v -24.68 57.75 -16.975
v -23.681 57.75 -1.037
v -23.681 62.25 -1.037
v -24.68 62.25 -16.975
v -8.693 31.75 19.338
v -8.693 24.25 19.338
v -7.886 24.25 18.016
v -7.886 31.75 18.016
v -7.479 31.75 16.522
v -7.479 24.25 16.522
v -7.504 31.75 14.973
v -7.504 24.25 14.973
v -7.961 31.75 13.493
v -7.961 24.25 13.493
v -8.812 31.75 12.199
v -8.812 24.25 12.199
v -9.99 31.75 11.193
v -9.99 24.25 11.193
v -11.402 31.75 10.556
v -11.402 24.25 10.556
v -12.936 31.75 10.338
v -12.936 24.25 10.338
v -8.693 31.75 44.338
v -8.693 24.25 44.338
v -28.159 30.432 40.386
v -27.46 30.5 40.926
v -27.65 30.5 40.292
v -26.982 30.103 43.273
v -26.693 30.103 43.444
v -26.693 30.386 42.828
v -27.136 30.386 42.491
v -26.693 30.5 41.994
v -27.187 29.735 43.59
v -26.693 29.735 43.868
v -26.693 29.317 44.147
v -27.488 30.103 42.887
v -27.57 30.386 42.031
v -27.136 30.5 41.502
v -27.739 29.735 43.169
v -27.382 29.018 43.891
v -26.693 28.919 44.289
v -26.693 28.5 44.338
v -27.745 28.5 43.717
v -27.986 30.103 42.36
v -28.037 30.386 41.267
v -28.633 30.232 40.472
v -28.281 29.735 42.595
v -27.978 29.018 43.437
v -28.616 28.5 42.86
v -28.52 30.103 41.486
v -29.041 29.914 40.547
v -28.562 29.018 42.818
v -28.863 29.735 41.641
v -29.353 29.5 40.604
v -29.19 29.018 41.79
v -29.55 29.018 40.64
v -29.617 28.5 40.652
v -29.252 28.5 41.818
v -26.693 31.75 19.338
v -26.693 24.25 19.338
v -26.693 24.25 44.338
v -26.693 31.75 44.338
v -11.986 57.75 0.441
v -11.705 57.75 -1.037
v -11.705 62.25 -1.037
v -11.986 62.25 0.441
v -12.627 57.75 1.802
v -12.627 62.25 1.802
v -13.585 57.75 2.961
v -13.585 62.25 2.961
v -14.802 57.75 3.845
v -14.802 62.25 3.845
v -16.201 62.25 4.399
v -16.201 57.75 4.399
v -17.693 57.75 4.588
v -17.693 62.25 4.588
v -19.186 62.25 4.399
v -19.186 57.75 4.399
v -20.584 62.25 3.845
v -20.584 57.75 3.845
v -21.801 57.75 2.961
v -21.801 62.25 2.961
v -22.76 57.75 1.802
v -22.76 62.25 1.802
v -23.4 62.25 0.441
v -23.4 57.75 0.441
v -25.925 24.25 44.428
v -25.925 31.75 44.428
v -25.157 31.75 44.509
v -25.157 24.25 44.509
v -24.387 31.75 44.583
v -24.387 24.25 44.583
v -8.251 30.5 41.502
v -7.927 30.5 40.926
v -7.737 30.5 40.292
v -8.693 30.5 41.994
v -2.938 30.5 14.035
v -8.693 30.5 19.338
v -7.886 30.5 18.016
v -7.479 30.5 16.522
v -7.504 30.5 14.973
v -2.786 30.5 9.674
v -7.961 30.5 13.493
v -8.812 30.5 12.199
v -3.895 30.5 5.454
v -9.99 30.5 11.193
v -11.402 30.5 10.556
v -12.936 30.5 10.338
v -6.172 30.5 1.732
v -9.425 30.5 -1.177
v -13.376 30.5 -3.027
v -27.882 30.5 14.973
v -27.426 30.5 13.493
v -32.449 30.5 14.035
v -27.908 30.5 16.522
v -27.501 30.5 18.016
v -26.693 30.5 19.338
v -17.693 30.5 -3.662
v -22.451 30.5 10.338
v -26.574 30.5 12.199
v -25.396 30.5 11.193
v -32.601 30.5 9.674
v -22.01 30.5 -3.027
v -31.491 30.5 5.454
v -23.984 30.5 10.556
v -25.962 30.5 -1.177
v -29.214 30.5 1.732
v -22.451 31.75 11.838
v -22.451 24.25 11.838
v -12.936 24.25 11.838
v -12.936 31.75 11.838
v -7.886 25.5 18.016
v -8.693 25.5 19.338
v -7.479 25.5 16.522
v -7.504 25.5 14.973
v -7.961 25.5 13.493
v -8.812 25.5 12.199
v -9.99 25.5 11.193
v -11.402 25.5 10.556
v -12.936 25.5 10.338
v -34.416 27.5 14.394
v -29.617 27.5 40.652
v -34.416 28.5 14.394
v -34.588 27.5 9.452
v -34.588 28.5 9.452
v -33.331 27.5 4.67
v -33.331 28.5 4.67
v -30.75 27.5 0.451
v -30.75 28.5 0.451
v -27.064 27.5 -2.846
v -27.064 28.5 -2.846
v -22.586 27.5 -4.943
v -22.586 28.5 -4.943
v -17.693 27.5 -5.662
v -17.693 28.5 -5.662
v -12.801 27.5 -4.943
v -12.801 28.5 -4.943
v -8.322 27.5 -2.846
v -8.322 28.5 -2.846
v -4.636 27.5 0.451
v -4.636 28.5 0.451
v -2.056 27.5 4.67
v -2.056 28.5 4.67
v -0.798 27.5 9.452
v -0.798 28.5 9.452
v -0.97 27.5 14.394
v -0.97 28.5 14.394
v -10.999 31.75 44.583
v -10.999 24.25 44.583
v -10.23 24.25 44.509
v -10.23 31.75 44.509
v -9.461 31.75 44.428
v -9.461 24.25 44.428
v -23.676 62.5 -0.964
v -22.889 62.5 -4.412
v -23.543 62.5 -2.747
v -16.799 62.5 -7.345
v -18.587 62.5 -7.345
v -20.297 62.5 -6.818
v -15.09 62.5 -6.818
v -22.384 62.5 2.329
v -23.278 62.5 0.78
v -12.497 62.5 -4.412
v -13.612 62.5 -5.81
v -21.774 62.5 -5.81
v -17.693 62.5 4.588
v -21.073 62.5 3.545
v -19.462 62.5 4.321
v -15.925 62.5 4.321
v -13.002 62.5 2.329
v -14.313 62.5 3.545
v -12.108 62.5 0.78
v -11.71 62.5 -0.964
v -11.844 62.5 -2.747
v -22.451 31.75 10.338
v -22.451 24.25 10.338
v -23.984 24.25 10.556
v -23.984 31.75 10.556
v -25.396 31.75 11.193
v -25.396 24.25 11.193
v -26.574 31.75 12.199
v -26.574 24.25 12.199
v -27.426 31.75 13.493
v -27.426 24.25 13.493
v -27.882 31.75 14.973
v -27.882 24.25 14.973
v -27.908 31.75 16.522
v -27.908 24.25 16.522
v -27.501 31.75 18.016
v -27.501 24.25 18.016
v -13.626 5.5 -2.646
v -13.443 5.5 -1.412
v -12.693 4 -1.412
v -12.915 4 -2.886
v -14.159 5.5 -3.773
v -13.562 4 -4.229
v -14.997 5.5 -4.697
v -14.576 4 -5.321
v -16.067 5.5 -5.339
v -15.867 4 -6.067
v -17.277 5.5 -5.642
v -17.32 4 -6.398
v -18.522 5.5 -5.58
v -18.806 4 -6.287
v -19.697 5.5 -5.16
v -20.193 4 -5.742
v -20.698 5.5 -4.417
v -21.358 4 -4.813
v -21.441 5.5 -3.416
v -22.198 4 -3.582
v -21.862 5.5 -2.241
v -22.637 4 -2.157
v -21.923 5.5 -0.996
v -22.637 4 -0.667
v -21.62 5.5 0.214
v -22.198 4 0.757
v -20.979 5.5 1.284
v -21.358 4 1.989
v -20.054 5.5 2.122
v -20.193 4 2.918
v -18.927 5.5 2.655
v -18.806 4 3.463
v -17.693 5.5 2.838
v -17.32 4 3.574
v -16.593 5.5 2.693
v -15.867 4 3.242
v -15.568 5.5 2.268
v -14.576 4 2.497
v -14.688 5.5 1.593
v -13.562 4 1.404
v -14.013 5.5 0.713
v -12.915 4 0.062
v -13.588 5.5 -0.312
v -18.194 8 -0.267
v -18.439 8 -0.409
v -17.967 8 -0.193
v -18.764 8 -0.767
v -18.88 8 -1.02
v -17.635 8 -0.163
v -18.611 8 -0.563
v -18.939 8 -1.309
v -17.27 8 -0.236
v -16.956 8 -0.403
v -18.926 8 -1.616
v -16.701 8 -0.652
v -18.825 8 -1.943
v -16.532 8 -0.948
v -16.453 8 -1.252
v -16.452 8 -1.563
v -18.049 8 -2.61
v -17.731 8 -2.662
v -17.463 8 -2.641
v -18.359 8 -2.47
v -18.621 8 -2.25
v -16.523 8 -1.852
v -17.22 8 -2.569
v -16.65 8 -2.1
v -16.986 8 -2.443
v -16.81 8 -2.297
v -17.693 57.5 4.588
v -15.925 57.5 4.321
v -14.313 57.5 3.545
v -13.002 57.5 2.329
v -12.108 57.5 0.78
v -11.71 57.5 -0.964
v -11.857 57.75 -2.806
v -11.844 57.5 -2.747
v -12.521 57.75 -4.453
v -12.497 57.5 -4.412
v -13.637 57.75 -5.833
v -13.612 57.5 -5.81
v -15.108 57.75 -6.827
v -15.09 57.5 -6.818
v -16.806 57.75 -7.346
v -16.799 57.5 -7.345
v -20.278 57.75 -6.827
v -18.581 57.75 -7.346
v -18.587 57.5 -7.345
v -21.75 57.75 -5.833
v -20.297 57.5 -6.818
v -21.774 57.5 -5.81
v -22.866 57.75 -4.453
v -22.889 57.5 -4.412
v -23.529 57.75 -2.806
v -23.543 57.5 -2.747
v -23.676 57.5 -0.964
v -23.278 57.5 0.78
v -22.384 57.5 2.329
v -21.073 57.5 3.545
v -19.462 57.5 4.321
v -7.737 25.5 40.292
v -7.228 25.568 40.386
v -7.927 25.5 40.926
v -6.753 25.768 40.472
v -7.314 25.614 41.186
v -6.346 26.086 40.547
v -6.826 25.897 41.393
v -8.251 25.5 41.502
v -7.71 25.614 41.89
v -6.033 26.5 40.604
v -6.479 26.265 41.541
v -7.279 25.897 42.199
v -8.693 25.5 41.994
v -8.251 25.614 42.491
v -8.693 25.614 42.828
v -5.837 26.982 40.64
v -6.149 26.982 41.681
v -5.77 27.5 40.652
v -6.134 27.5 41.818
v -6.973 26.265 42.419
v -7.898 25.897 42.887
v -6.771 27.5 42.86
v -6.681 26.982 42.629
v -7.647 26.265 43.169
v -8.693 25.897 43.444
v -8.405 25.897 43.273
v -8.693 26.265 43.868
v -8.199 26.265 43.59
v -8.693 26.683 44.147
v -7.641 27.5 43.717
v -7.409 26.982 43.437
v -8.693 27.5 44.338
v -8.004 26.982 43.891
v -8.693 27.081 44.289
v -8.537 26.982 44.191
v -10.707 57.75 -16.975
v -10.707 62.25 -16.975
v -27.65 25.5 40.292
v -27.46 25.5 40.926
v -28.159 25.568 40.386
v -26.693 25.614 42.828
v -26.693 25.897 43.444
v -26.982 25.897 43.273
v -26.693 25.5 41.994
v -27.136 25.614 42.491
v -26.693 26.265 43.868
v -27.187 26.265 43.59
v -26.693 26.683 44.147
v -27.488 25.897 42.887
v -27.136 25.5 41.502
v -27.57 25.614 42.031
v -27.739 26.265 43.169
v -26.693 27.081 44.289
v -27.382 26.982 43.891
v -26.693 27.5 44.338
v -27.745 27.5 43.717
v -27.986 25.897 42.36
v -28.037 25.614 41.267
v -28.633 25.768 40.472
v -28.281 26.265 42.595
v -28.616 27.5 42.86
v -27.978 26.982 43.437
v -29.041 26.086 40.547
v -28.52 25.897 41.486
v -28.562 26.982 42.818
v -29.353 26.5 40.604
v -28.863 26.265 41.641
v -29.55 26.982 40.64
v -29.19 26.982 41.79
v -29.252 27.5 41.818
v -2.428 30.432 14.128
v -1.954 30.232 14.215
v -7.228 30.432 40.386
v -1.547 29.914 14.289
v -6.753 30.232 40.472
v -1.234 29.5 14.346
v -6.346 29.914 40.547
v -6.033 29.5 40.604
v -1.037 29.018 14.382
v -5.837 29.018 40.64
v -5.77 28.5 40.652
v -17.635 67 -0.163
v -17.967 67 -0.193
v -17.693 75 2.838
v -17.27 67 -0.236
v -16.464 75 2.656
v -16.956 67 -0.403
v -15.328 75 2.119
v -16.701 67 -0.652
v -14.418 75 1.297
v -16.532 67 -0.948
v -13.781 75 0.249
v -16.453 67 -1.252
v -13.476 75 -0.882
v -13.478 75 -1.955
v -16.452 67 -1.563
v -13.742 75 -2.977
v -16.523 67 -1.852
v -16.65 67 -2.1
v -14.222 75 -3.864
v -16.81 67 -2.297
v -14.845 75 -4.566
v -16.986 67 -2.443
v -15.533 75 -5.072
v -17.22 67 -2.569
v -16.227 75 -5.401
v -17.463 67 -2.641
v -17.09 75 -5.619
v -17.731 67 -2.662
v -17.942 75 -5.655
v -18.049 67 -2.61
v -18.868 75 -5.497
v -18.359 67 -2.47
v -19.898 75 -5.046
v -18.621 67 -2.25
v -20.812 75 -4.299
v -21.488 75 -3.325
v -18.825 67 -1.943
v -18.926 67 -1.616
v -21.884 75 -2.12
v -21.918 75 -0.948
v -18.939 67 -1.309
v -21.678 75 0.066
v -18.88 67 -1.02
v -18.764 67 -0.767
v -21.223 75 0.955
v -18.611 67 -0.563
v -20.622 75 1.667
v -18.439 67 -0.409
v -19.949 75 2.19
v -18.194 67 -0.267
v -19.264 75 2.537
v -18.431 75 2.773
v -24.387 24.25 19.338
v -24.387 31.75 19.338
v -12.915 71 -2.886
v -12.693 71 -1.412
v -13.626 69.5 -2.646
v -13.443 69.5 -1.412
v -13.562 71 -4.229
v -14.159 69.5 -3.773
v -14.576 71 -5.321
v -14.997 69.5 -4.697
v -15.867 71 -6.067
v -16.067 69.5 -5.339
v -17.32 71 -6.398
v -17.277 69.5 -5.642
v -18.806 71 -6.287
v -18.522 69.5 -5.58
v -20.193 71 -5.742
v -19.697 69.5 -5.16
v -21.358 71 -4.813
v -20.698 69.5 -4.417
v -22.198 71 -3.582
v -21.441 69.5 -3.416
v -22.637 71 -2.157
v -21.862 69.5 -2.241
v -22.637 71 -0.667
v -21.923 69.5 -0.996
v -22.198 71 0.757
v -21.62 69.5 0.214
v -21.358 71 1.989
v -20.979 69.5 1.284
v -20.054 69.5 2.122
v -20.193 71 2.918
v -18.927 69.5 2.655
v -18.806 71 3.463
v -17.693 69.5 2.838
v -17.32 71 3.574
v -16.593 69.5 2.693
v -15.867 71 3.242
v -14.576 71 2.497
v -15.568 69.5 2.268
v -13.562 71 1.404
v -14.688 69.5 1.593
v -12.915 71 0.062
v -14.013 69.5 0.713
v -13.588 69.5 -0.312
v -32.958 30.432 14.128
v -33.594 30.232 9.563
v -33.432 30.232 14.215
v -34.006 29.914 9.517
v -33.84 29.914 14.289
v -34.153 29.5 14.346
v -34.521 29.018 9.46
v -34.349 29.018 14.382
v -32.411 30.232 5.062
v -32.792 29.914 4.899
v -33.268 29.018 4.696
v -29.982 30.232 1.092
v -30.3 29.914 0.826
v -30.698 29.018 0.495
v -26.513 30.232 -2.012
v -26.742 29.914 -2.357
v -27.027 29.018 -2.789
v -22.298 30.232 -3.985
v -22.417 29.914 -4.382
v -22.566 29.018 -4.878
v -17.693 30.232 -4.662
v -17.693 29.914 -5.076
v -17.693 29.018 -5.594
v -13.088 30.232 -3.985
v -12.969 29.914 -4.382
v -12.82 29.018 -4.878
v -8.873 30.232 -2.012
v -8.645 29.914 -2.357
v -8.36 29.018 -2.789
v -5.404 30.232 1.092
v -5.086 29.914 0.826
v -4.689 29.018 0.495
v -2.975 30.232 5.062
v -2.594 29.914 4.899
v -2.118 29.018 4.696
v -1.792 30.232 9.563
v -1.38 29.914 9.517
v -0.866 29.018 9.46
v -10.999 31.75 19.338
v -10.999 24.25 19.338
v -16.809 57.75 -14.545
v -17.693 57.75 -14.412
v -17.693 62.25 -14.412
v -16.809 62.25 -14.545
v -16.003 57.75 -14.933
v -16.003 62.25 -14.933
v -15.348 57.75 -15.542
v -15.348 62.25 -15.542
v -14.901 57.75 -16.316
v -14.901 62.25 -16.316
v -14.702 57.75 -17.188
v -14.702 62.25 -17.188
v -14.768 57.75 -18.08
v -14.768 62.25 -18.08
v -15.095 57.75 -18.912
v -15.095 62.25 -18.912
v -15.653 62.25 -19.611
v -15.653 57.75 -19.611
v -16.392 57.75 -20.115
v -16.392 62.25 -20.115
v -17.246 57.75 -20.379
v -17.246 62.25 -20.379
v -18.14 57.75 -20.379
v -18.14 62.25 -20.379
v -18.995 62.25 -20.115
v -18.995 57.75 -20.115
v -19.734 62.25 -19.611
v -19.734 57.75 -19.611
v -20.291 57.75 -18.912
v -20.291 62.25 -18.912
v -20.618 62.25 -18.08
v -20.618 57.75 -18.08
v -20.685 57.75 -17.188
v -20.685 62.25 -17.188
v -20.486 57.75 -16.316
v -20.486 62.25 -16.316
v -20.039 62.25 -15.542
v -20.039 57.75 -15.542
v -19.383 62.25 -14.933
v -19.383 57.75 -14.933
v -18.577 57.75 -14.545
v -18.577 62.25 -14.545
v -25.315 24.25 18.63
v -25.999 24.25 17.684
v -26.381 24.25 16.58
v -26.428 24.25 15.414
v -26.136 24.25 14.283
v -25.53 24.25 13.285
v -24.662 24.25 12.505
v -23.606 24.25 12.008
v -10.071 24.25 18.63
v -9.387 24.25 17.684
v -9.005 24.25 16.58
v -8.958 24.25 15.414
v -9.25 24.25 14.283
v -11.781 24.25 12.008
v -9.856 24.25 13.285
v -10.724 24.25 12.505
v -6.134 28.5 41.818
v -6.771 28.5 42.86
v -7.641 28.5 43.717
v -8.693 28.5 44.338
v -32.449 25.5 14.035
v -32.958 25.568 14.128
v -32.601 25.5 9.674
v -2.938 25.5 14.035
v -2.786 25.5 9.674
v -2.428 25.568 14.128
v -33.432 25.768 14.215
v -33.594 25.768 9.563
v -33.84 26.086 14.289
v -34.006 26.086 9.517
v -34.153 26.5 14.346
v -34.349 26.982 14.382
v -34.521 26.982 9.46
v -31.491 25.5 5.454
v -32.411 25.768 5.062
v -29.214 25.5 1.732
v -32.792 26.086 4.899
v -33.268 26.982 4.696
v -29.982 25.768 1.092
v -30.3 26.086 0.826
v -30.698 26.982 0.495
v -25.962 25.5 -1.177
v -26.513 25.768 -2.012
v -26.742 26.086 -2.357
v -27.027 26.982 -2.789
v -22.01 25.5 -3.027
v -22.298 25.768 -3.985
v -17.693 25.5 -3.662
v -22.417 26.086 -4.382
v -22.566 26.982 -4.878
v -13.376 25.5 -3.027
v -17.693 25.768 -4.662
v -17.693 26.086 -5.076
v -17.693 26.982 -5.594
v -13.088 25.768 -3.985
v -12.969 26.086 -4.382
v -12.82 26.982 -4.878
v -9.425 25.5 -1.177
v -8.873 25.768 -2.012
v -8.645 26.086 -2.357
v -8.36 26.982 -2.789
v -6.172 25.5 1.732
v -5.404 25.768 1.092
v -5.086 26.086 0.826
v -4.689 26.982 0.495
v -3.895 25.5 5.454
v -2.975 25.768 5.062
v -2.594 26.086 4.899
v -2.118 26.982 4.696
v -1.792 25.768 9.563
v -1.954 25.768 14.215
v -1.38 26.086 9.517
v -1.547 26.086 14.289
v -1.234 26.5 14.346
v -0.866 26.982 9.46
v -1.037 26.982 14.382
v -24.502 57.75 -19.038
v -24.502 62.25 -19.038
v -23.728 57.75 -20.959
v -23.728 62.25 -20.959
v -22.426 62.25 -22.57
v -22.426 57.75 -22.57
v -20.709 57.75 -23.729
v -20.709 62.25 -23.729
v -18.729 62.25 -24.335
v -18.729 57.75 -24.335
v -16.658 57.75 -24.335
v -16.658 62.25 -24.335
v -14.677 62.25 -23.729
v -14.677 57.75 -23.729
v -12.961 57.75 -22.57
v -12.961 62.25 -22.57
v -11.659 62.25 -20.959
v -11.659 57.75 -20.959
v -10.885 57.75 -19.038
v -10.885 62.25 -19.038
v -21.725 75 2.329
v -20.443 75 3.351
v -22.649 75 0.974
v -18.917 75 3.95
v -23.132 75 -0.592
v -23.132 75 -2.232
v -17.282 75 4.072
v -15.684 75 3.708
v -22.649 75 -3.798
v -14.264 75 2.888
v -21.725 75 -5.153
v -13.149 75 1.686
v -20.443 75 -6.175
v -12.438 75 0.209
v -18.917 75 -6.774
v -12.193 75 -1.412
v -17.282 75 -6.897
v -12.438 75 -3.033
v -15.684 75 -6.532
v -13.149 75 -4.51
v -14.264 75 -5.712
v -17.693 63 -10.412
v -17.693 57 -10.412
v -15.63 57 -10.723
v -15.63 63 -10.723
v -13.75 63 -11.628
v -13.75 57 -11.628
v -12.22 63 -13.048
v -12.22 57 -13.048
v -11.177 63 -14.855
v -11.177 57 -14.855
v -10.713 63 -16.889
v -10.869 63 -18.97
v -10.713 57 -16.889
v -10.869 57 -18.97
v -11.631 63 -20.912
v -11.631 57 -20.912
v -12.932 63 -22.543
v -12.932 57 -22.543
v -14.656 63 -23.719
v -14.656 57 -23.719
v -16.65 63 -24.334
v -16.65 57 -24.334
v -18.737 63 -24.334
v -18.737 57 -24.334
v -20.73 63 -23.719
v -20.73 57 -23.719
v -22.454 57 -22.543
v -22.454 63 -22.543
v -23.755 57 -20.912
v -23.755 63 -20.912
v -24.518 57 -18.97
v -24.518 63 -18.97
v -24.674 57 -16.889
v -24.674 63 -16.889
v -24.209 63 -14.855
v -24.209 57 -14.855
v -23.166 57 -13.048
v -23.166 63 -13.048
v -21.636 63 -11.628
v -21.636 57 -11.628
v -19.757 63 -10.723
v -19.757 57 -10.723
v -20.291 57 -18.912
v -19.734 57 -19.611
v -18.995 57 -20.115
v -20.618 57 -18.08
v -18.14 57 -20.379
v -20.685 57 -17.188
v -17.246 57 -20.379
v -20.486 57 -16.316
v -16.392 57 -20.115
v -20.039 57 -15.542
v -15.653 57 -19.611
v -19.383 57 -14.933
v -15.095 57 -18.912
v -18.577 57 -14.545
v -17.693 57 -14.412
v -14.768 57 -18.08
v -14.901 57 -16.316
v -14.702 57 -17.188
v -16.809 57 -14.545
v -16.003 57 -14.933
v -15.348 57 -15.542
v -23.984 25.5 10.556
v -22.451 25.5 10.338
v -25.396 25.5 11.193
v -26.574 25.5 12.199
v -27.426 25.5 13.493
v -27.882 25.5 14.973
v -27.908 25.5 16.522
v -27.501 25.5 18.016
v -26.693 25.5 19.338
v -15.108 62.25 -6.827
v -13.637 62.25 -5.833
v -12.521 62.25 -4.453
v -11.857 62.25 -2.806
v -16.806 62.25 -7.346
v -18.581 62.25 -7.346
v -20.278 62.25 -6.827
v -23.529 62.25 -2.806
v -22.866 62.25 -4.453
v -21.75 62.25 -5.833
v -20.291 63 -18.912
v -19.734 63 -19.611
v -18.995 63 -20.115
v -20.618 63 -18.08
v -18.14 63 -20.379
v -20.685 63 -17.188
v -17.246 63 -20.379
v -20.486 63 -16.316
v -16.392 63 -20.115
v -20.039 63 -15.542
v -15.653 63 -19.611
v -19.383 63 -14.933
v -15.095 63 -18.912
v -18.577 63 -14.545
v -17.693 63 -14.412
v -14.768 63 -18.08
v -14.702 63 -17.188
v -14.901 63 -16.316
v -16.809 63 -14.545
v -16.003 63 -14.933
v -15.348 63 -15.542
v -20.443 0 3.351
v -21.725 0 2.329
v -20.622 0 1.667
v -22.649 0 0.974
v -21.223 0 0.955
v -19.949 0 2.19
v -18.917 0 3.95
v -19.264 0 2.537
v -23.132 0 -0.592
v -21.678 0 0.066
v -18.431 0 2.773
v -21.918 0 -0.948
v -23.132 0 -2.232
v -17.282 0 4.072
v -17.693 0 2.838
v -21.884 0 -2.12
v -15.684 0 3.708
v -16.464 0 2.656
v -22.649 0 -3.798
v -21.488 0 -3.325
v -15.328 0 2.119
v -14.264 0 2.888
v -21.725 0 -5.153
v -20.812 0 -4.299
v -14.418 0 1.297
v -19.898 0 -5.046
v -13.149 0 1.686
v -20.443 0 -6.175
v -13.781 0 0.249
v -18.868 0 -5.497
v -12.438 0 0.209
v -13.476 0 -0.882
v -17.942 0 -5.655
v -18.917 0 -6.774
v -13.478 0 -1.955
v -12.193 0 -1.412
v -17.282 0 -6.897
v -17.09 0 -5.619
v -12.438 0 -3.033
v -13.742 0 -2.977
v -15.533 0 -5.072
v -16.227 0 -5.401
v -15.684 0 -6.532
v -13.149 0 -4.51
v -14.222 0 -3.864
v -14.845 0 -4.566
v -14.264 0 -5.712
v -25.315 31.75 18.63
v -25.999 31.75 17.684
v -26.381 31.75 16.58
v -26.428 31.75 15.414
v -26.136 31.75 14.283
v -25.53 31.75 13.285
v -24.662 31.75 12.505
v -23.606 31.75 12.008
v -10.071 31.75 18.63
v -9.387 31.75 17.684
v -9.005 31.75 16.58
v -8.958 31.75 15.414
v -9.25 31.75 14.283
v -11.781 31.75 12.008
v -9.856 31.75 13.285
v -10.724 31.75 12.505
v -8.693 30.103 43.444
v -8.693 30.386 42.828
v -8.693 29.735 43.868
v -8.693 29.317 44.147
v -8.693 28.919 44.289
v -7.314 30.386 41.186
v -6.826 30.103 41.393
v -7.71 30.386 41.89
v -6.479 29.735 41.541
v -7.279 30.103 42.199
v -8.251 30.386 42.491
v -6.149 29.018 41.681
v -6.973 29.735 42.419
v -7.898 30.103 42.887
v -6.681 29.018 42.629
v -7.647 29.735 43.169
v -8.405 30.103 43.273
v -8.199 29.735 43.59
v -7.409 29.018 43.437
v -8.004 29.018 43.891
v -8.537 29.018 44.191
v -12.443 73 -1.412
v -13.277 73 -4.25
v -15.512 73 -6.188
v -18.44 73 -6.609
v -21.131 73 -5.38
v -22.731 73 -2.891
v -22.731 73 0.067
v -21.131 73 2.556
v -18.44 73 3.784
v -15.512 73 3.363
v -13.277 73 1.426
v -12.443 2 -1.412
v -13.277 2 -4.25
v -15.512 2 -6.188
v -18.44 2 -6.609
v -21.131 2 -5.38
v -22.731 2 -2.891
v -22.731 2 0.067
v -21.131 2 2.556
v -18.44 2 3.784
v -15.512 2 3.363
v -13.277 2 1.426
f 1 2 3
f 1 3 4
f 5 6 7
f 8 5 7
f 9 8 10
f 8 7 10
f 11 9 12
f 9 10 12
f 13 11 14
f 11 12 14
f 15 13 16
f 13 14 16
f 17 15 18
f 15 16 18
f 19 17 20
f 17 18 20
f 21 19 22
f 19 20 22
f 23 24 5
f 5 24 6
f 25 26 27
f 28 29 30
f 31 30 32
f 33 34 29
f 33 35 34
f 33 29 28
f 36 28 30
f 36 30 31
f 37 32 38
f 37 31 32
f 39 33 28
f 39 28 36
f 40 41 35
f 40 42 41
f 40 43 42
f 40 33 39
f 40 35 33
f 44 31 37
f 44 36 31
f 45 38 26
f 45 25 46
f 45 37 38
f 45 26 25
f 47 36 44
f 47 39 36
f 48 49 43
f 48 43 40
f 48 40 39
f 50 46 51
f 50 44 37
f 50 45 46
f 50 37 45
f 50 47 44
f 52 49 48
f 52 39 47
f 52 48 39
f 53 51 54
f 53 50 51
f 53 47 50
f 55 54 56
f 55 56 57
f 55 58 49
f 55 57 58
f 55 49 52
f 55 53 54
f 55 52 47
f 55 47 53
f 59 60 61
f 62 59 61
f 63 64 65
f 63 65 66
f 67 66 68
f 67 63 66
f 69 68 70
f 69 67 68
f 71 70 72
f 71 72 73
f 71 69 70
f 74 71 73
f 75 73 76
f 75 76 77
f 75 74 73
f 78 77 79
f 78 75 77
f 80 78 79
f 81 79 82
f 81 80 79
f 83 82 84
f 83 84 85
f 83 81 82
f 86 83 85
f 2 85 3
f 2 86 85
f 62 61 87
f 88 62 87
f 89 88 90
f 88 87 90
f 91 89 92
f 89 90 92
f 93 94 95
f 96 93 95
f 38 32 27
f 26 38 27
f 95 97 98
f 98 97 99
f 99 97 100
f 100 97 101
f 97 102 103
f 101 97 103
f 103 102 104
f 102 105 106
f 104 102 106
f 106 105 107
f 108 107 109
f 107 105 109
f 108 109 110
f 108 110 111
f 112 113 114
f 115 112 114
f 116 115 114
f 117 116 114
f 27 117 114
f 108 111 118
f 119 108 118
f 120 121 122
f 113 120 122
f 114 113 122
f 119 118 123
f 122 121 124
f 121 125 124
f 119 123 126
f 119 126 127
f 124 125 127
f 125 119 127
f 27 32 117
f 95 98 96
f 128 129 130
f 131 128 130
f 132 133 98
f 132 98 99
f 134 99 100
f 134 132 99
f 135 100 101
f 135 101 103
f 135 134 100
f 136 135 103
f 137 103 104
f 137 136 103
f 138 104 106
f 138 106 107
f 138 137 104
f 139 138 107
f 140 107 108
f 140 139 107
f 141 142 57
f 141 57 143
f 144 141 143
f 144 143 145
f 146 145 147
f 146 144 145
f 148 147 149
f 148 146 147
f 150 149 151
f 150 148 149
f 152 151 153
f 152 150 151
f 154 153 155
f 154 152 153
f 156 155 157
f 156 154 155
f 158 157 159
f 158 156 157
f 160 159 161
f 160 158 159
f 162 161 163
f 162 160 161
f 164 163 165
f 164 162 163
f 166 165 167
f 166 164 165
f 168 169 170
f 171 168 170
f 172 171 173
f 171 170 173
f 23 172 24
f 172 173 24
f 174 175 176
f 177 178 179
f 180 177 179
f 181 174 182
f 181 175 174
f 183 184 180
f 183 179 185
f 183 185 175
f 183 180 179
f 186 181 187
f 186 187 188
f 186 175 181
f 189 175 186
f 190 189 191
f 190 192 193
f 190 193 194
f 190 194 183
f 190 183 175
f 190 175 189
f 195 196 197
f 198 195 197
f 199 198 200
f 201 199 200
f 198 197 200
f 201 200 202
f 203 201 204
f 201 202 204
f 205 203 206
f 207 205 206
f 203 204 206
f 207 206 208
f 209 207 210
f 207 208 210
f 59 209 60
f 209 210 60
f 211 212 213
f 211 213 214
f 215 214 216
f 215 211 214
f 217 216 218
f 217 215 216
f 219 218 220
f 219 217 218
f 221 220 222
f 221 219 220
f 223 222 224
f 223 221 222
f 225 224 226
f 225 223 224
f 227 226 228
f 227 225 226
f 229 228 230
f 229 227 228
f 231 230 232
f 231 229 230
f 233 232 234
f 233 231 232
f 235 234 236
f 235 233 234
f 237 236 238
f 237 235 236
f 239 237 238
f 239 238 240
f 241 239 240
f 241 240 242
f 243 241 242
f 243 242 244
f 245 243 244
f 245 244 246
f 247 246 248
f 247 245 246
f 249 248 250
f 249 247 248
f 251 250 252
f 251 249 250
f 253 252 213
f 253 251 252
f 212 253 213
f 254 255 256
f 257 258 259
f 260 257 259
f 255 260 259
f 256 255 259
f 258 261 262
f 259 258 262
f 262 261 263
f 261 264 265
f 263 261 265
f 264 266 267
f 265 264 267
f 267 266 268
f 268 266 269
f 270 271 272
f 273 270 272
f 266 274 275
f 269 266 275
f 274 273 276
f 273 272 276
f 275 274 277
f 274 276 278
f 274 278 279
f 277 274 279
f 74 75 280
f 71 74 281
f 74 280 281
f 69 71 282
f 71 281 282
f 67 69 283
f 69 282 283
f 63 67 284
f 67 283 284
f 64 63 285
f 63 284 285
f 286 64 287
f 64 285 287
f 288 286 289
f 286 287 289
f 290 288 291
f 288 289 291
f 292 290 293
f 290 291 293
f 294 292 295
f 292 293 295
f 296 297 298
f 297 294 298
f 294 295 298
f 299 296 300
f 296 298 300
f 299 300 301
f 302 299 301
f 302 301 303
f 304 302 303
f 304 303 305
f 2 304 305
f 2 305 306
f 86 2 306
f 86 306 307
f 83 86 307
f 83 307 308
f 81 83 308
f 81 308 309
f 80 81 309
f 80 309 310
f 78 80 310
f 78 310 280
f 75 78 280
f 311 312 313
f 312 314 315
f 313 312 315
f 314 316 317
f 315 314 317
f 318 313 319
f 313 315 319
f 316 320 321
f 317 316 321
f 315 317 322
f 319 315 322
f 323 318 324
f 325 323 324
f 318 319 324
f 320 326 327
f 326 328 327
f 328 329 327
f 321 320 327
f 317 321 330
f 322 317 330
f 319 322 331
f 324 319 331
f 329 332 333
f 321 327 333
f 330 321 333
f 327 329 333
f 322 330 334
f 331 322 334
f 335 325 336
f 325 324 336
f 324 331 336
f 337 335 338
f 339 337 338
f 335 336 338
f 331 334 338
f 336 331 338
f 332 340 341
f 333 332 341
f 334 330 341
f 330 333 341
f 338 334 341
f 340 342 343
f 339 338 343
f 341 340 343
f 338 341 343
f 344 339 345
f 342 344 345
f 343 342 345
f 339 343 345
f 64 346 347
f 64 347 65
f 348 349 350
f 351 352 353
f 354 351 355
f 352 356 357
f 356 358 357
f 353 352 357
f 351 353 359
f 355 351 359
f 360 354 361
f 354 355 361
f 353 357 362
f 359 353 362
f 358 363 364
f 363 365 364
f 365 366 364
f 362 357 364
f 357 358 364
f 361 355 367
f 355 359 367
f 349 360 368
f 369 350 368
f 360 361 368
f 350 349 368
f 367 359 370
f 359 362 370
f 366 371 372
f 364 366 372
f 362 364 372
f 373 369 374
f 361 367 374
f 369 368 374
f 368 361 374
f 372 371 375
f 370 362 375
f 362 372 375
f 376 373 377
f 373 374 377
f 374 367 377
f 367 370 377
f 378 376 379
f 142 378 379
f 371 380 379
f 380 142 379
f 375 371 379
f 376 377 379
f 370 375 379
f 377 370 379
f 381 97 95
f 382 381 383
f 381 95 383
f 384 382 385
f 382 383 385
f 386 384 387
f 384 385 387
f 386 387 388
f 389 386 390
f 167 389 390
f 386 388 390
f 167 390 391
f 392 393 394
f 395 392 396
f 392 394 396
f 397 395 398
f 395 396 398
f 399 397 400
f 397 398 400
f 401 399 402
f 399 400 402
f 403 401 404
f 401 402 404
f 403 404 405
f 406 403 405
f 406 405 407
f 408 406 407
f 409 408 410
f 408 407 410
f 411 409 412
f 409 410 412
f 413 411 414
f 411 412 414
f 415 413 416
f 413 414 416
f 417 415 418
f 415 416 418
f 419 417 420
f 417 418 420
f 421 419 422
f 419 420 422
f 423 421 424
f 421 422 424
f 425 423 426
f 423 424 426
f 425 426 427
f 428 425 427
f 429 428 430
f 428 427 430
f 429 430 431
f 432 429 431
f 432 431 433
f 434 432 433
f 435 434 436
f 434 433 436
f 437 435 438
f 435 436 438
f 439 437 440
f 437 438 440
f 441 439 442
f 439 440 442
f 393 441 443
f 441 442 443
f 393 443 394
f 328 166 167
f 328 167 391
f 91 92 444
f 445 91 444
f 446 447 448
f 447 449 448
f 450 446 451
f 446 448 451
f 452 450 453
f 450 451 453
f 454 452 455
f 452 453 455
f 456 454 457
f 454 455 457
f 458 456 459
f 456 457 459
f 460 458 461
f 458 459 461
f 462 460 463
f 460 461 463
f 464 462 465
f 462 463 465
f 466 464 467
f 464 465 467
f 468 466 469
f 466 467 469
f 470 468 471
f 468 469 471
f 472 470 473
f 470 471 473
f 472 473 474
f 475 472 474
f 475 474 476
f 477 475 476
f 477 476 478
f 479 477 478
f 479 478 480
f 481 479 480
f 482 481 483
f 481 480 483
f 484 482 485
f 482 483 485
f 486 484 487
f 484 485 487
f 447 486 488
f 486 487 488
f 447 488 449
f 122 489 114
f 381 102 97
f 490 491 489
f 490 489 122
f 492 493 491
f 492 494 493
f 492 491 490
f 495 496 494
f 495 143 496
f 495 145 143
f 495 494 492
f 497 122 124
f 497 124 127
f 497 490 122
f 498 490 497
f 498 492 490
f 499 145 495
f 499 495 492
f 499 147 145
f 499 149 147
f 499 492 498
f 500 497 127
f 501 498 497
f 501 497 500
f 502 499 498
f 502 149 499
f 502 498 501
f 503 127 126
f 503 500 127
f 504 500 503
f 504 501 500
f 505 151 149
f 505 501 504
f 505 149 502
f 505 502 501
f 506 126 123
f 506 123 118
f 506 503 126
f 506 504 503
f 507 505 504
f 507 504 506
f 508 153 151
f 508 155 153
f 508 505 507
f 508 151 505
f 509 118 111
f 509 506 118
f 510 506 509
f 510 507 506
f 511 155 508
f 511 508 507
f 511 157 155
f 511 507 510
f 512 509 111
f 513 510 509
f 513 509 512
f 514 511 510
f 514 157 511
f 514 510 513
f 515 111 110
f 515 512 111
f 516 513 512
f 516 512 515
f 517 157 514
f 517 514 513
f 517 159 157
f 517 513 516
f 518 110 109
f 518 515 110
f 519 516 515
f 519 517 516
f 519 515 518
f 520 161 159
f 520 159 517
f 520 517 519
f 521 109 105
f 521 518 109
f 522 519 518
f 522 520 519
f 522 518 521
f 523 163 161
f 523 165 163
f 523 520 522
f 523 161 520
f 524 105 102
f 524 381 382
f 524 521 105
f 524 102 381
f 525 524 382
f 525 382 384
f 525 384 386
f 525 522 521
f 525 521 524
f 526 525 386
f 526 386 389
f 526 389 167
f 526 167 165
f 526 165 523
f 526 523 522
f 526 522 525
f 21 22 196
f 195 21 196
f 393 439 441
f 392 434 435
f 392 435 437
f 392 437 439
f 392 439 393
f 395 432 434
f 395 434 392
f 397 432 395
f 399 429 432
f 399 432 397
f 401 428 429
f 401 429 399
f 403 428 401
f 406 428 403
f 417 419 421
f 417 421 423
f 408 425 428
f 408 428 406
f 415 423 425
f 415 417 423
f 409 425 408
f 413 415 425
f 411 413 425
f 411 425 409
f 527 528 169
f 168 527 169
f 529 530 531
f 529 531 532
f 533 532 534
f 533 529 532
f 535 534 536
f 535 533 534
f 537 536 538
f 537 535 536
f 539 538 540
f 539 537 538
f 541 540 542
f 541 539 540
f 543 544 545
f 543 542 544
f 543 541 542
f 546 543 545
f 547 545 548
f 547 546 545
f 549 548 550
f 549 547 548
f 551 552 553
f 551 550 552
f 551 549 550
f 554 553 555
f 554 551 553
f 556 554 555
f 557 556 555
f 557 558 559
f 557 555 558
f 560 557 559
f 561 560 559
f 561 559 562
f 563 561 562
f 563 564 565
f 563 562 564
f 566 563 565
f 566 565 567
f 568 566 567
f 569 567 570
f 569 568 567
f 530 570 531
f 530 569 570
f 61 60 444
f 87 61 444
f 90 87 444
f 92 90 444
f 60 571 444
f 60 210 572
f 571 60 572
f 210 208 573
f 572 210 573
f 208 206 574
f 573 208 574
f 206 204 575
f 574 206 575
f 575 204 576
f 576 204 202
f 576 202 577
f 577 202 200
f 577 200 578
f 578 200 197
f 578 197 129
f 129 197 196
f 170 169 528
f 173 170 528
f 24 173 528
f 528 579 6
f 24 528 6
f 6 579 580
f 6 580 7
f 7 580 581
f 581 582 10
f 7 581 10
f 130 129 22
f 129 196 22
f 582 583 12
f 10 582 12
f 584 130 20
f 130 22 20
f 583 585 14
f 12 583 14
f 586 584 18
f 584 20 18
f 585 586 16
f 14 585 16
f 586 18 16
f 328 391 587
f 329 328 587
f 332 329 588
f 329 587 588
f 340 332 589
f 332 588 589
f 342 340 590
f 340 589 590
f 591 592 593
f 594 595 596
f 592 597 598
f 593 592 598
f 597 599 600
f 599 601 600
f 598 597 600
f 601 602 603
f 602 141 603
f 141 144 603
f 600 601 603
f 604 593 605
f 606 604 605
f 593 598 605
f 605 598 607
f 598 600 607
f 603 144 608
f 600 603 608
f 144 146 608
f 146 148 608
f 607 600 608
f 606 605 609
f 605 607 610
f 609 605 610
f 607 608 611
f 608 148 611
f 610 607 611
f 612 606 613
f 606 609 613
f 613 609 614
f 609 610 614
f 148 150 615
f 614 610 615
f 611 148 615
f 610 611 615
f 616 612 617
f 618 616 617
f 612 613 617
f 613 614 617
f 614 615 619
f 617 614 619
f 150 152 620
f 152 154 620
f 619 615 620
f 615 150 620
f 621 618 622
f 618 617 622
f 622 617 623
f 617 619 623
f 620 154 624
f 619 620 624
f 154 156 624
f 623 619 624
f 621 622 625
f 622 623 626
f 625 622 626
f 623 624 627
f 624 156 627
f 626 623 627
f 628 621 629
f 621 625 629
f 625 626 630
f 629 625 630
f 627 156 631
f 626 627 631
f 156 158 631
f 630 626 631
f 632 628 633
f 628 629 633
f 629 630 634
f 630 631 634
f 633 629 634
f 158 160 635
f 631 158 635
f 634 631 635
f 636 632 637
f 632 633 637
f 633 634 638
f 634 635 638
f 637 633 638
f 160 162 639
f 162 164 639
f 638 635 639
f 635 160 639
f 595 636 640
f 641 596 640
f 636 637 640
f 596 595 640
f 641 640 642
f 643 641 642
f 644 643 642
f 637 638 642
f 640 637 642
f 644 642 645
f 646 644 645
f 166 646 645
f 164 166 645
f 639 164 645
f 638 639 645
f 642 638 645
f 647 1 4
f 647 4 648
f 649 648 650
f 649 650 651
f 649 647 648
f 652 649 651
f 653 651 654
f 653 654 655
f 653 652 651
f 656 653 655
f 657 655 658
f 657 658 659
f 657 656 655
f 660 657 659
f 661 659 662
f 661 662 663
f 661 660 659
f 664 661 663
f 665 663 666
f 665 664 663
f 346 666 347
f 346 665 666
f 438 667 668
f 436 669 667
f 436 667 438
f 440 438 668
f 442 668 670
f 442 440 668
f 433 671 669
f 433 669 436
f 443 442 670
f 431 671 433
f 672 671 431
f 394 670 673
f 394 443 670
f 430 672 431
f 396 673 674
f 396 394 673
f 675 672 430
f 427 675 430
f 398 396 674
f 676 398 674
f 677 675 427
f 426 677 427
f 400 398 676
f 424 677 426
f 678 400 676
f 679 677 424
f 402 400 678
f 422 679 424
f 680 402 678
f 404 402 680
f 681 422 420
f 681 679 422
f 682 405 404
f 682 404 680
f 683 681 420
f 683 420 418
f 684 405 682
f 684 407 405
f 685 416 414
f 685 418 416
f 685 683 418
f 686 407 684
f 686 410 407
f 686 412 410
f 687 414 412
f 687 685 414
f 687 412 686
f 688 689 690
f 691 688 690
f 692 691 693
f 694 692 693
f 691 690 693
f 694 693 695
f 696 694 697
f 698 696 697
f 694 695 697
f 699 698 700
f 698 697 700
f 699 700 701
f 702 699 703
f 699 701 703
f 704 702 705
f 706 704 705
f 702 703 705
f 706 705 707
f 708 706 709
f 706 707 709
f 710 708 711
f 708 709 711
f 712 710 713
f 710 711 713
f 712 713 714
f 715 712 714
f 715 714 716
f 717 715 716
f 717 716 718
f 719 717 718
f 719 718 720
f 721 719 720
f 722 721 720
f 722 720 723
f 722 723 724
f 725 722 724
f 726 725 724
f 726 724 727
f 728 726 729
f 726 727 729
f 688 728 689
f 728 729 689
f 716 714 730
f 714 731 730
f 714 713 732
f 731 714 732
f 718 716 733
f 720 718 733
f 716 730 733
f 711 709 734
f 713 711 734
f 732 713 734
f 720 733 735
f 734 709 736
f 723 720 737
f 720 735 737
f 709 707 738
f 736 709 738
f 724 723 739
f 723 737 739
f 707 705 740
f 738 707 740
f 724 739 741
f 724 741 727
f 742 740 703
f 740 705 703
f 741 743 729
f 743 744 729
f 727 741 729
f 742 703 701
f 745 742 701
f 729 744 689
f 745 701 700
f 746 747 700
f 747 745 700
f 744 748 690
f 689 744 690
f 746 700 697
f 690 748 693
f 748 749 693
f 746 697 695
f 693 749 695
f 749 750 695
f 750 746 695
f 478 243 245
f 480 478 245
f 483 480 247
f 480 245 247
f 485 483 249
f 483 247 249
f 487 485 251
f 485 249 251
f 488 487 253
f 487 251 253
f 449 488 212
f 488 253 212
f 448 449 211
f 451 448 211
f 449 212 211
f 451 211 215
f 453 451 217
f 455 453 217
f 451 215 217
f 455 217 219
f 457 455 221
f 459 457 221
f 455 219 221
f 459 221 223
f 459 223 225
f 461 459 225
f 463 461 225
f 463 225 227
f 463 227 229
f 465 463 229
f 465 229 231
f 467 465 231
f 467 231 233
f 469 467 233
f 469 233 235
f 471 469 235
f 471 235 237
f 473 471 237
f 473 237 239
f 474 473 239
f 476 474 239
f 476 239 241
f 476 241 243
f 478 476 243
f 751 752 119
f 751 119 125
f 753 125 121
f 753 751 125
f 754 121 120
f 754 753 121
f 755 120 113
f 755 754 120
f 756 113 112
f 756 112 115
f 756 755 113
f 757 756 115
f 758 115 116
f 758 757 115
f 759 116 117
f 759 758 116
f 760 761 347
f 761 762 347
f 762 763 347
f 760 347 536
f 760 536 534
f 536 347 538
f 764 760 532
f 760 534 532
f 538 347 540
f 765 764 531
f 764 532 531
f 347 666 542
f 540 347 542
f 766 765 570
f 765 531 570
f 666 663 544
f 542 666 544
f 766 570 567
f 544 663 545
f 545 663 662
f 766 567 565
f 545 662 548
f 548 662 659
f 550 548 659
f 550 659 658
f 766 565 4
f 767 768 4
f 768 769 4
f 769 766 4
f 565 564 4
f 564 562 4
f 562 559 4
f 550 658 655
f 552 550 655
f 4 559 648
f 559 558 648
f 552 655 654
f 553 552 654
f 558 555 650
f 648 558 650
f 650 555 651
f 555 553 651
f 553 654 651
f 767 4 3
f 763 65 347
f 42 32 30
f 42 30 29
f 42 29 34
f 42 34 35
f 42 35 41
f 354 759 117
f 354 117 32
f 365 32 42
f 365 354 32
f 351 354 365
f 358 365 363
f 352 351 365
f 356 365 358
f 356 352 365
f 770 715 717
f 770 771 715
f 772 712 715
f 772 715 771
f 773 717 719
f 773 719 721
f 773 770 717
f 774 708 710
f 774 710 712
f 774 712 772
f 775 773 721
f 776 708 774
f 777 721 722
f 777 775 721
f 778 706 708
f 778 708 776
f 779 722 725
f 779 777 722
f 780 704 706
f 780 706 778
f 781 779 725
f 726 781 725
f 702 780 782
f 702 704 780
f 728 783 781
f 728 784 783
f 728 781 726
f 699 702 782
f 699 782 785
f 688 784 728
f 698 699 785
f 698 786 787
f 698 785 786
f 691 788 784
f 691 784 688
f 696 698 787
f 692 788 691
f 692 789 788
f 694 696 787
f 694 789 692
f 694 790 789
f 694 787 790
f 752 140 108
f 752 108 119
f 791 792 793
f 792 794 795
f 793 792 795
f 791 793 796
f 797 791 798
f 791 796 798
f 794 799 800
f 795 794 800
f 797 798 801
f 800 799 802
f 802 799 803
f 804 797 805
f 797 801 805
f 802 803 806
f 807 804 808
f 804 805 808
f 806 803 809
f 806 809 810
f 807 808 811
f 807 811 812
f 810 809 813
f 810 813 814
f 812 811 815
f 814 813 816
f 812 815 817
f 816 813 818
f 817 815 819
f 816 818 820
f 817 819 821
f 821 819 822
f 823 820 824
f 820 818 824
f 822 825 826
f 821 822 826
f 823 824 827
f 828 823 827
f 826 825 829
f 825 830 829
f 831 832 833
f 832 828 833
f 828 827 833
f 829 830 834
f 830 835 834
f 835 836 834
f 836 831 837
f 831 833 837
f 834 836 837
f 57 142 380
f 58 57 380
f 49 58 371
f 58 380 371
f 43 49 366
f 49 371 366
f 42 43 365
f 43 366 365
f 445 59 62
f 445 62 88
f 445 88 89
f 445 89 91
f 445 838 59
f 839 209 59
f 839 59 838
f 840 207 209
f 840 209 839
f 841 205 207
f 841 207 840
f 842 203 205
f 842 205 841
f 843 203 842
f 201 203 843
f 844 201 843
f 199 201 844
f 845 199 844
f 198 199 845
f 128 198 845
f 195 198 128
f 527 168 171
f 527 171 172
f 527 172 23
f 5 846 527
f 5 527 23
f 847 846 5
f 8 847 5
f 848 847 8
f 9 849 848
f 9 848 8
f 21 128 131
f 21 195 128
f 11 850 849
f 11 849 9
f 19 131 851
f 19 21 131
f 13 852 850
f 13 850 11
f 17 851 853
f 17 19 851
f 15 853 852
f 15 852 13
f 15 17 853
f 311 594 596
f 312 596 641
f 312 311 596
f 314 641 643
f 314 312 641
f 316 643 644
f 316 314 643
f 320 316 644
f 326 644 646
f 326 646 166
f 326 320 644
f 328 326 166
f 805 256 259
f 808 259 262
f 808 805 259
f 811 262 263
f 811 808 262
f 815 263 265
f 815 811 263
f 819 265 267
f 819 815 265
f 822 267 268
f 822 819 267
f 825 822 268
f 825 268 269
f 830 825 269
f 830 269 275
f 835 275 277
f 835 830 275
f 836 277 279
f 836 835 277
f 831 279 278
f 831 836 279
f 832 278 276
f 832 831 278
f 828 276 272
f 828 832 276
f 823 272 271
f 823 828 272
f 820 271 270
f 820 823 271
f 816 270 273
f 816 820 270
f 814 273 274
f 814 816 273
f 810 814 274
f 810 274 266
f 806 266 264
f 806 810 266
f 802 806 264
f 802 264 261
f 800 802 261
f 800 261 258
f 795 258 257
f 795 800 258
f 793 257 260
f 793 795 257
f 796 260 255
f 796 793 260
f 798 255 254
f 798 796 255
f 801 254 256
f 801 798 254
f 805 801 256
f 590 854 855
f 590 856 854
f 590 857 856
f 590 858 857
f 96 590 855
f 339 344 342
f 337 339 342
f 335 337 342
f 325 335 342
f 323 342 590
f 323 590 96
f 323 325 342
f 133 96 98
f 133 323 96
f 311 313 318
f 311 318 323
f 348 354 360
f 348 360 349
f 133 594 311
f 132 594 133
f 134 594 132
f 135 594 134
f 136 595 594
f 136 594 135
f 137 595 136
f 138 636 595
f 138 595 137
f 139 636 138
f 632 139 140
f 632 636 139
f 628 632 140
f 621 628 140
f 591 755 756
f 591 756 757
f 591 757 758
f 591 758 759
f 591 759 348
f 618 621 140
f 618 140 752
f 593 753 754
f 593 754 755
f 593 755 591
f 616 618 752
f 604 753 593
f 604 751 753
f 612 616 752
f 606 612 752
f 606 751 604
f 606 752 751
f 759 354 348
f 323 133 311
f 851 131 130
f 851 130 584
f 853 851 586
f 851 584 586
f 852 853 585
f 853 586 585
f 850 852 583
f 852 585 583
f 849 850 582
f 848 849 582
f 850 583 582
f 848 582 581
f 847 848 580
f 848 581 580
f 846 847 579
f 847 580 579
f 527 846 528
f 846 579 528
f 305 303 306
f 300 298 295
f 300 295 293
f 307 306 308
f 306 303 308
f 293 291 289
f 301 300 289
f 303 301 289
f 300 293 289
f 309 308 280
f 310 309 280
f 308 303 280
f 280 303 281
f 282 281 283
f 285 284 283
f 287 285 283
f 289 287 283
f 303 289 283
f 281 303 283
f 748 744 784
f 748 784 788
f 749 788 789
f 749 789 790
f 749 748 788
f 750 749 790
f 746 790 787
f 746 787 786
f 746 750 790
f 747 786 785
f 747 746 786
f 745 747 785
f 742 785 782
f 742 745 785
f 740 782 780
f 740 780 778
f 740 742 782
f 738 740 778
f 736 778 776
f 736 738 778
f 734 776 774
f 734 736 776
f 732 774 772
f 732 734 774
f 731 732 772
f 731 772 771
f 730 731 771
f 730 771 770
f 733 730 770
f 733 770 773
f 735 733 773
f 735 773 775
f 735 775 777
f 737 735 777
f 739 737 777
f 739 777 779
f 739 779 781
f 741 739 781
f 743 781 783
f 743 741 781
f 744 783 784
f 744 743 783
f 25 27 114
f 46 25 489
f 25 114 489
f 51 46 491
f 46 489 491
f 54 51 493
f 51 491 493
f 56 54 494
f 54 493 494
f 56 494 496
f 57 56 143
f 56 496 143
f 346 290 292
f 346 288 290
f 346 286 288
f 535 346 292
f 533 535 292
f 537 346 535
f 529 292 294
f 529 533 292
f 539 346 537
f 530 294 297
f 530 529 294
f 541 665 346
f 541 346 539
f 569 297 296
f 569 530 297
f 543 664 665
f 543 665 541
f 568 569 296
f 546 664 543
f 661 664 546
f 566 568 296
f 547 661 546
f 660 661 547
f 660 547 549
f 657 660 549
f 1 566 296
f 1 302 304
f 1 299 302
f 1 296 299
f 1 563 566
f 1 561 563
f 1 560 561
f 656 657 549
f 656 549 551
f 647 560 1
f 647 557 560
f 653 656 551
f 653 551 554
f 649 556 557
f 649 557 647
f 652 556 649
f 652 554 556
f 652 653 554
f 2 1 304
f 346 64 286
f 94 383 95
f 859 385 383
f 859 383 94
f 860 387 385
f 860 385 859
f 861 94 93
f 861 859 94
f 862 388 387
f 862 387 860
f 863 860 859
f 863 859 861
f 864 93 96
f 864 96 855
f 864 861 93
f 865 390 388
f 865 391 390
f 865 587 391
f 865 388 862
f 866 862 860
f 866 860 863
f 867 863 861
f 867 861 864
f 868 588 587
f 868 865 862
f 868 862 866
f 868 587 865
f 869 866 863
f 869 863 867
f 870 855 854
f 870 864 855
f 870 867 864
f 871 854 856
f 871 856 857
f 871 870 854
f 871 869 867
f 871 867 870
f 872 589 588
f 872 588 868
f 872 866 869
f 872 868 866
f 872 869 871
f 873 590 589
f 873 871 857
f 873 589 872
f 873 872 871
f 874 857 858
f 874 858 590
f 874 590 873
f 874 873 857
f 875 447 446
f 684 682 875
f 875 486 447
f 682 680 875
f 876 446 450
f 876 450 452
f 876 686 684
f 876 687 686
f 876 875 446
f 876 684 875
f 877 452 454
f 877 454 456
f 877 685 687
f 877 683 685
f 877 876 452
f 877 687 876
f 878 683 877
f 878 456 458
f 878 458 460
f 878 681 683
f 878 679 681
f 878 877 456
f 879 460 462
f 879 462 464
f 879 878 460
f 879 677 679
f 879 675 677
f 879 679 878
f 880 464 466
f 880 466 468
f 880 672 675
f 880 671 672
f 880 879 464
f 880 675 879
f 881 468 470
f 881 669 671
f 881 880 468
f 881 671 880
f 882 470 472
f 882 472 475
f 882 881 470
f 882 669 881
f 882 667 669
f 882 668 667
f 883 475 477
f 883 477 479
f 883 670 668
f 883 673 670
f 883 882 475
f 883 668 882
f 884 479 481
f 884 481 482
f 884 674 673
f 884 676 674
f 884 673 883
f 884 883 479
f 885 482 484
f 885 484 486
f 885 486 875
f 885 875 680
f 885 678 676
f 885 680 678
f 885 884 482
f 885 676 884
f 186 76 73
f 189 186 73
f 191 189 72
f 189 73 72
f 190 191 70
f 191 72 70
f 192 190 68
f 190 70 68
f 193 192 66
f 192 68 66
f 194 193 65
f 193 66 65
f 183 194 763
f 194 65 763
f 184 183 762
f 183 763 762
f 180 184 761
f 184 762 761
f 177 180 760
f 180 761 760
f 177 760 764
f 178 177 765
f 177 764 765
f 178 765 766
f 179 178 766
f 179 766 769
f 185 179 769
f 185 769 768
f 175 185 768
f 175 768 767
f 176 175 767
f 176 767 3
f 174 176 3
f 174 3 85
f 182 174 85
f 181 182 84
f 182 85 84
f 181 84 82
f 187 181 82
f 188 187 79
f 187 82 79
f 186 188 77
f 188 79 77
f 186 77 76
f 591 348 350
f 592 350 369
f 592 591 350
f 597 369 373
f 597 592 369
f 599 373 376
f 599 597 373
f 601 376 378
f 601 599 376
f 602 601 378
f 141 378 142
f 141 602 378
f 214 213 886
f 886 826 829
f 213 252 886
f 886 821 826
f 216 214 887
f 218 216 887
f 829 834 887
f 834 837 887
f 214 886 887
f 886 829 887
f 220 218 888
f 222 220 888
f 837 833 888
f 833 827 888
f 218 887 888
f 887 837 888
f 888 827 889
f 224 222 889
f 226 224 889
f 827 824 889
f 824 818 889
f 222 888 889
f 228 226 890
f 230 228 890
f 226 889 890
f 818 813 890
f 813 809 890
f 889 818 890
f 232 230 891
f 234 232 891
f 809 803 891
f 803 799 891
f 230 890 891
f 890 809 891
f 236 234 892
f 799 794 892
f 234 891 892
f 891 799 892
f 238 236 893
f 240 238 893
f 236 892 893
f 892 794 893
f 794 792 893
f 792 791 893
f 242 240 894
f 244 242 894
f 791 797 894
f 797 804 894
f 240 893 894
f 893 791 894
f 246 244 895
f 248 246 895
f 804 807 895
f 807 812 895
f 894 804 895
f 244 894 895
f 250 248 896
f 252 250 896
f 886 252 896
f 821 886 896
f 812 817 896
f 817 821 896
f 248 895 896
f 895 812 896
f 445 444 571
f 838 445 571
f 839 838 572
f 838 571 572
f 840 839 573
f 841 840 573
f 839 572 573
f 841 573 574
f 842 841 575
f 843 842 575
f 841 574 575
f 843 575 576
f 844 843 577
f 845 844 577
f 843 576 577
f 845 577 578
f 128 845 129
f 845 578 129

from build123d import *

# Parameters (mm, degrees)
CROQUIS2_R                   = 5
CROQUIS1_R                   = 5.5
CROQUIS2_2_R                 = 5
CROQUIS3_R                   = 4.25
CROQUIS3_2_R                 = 4.25
SALIENTE_EXTRUIR1_DEPTH      = 64
SALIENTE_EXTRUIR2_DEPTH      = 2.5
SALIENTE_EXTRUIR2_DEPTH_BACK = 2.5
REDONDEO1_R                  = 5
REDONDEO2_R                  = 5
REDONDEO3_R                  = 2
REDONDEO4_R                  = 2
SALIENTE_EXTRUIR3_DEPTH      = 3.75
SALIENTE_EXTRUIR3_DEPTH_BACK = 3.75
SALIENTE_EXTRUIR4_DEPTH      = 3
SALIENTE_EXTRUIR4_DEPTH_BACK = 3
CROQUIS9_R                   = 7
SALIENTE_EXTRUIR5_DEPTH      = 2.25
SALIENTE_EXTRUIR5_DEPTH_BACK = 2.25
SALIENTE_EXTRUIR6_DEPTH      = 2.5
SALIENTE_EXTRUIR6_DEPTH_BACK = 2.5
CROQUIS8_R                   = 6
CORTAR_EXTRUIR1_START        = -6
CROQUIS11_R                  = 3
CORTAR_EXTRUIR1_DEPTH        = 6


with BuildPart() as part:
    # Croquis2 → Recubrir1 section 0
    with BuildSketch(Plane(origin=(0, 4, 0), x_dir=(1, 0, 0), z_dir=(0, 1, 0))):
        with Locations((-17.693226, 1.412135)):
            Circle(CROQUIS2_R)
    # Croquis1 → Recubrir1 section 1
    with BuildSketch(Plane(origin=(0, 0, 0), x_dir=(1, 0, 0), z_dir=(0, 1, 0))):
        with Locations((-17.693226, 1.412135)):
            Circle(CROQUIS1_R)
    recubrir1 = loft()

    # Croquis2<2> → Recubrir3 section 0
    with BuildSketch(Plane(origin=(0, 4, 0), x_dir=(1, 0, 0), z_dir=(0, 1, 0))):
        with Locations((-17.693226, 1.412135)):
            Circle(CROQUIS2_2_R)
    # Croquis3 → Recubrir3 section 1
    with BuildSketch(Plane(origin=(0, 5.5, 0), x_dir=(1, 0, 0), z_dir=(0, 1, 0))):
        with Locations((-17.693226, 1.412135)):
            Circle(CROQUIS3_R)
    recubrir3 = loft()

    # Croquis3<2> → Saliente-Extruir1 (add)
    with BuildSketch(Plane(origin=(0, 5.5, 0), x_dir=(1, 0, 0), z_dir=(0, 1, 0))):
        with Locations(Location((-17.693226, 1.412135, 0), (0, 0, 270))):
            Circle(CROQUIS3_2_R)
    extrude(amount=SALIENTE_EXTRUIR1_DEPTH)

    # Simetría1: Recubrir3 across plane
    add(recubrir3.mirror(Plane.ZX.offset(37.5)))

    # Simetría2: Recubrir1 across plane
    add(recubrir1.mirror(Plane.ZX.offset(37.5)))

    # Cortar-Recubrir1: read off the stored shape, not the designer's step
    # Cortar-Recubrir1: loft between two sections, ruled curve by curve
    cortar_recubrir1_from = [
        Edge.make_bspline([(-17.9674, 67, -0.192575), (-15.528278, 67, 0.355773), (-14.97993, 67, -2.083348), (-17.419052, 67, -2.631696), (-19.858173, 67, -3.180044), (-20.406521, 67, -0.740923), (-17.9674, 67, -0.192575)], [0, 0, 0, 0, 0.5, 0.5, 0.5, 1, 1, 1, 1], 3, [1, 0.333333, 0.333333, 1, 0.333333, 0.333333, 1]),
    ]
    cortar_recubrir1_to = [
        Edge.make_bspline([(-17.693226, 75, 2.837865), (-9.193226, 75, 2.837865), (-9.193226, 75, -5.662135), (-17.693226, 75, -5.662135), (-26.193226, 75, -5.662135), (-26.193226, 75, 2.837865), (-17.693226, 75, 2.837865)], [0, 0, 0, 0, 0.5, 0.5, 0.5, 1, 1, 1, 1], 3, [1, 0.333333, 0.333333, 1, 0.333333, 0.333333, 1]),
    ]
    cortar_recubrir1 = Solid(Shell([*[Face.make_surface_from_curves(cortar_recubrir1_from[k], cortar_recubrir1_to[k]) for k in range(1)], Face(Wire(cortar_recubrir1_from)), Face(Wire(cortar_recubrir1_to))]))
    add(cortar_recubrir1, mode=Mode.SUBTRACT)

    # Simetría3: Cortar-Recubrir1 across plane
    add(cortar_recubrir1.mirror(Plane.ZX.offset(37.5)), mode=Mode.SUBTRACT)


with BuildPart() as body_2:
    # Croquis5 → Saliente-Extruir2 (new, two sides: drawn at the far end of the back side and taken through both)
    with BuildSketch(Plane(origin=(0, 28, 0), x_dir=(1, 0, 0), z_dir=(0, 1, 0)).offset(-SALIENTE_EXTRUIR2_DEPTH_BACK)):
        with BuildLine():
            Line((-0.970266, -14.394431), (-6.443226, -44.337865))
            Line((-6.443226, -44.337865), (-8.693226, -44.337865))
            Line((-8.693226, -44.337865), (-8.693226, -19.337865))
            ThreePointArc((-8.693226, -19.337865), (-7.960929, -13.492657), (-12.935866, -10.337865))
            Line((-12.935866, -10.337865), (-22.450585, -10.337865))
            ThreePointArc((-22.450585, -10.337865), (-27.425522, -13.492657), (-26.693226, -19.337865))
            Line((-26.693226, -19.337865), (-26.693226, -44.337865))
            Line((-26.693226, -44.337865), (-28.943226, -44.337865))
            Line((-28.943226, -44.337865), (-34.416186, -14.394431))
            ThreePointArc((-34.416186, -14.394431), (-17.693226, 5.662135), (-0.970266, -14.394431))
        make_face()
    extrude(amount=SALIENTE_EXTRUIR2_DEPTH + SALIENTE_EXTRUIR2_DEPTH_BACK)

    # Redondeo1
    # the kernel refuses this fillet: 5 mm, written as the material it takes off along each edge
    with BuildSketch(Plane(origin=(-6.443226, 39.867246, 44.337865), x_dir=(0.1797980334285227, 0, -0.9837035463874448), z_dir=(0, -1, 0))) as redondeo1_piece_1:
        with BuildLine():
            CenterArc((3.746898, -5), REDONDEO1_R, 90, 56.128415)
            Line((-0.404546, -2.213333), (-0.487574, -2.1576))
            ThreePointArc((-0.487574, -2.1576), (-0.300643, -1.088687), (-0.09837, 0.01798))
            Line((-0.09837, 0.01798), (0, 0.1))
            Line((0, 0.1), (3.746898, 0.1))
            Line((3.746898, 0.1), (3.746898, 0))
        make_face()
    extrude(amount=23.734492, mode=Mode.SUBTRACT)

    # Redondeo2
    # the kernel refuses this fillet: 5 mm, written as the material it takes off along each edge
    with BuildSketch(Plane(origin=(-28.943226, 16.132754, 44.337865), x_dir=(-0.17979803342852285, 0, -0.9837035463874448), z_dir=(0, 1, 0))) as redondeo2_piece_1:
        with BuildLine():
            CenterArc((3.746898, -5), REDONDEO2_R, 90, 56.128415)
            Line((-0.404546, -2.213333), (-0.487574, -2.1576))
            ThreePointArc((-0.487574, -2.1576), (-0.300643, -1.088687), (-0.09837, 0.01798))
            Line((-0.09837, 0.01798), (0, 0.1))
            Line((0, 0.1), (3.746898, 0.1))
            Line((3.746898, 0.1), (3.746898, 0))
        make_face()
    extrude(amount=23.734492, mode=Mode.SUBTRACT)

    # Redondeo3
    redondeo3_edges = [body_2.edges().sort_by_distance(p)[0] for p in [
        (-17.693226, 30.5, -5.662135),
        (-32.016548, 30.5, 27.523229),
        (-3.369903, 30.5, 27.523229),
        (-6.770795, 30.5, 42.860294),
        (-28.615656, 30.5, 42.860294),
    ]]
    fillet(redondeo3_edges, radius=REDONDEO3_R)

    # Redondeo4
    redondeo4_edges = [body_2.edges().sort_by_distance(p)[0] for p in [
        (-17.693226, 25.5, -5.662135),
        (-3.369903, 25.5, 27.523229),
        (-6.770795, 25.5, 42.860294),
        (-28.615656, 25.5, 42.860294),
        (-32.016548, 25.5, 27.523229),
    ]]
    fillet(redondeo4_edges, radius=REDONDEO4_R)


with BuildPart() as body_3:
    # Croquis6 → Saliente-Extruir3 (new, two sides: drawn at the far end of the back side and taken through both)
    with BuildSketch(Plane(origin=(0, 28, 0), x_dir=(1, 0, 0), z_dir=(0, 1, 0)).offset(-SALIENTE_EXTRUIR3_DEPTH_BACK)):
        with BuildLine():
            Line((-22.450585, -11.837865), (-12.935866, -11.837865))
            ThreePointArc((-12.935866, -11.837865), (-9.062883, -14.837865), (-10.999375, -19.337865))
            Line((-10.999375, -19.337865), (-10.999375, -44.583261))
            ThreePointArc((-10.999375, -44.583261), (-9.845341, -44.469577), (-8.693226, -44.337865))
            Line((-8.693226, -44.337865), (-8.693226, -19.337865))
            ThreePointArc((-8.693226, -19.337865), (-7.960929, -13.492657), (-12.935866, -10.337865))
            Line((-12.935866, -10.337865), (-22.450585, -10.337865))
            ThreePointArc((-22.450585, -10.337865), (-27.425522, -13.492657), (-26.693226, -19.337865))
            Line((-26.693226, -19.337865), (-26.693226, -44.337865))
            ThreePointArc((-26.693226, -44.337865), (-25.541111, -44.469577), (-24.387077, -44.583261))
            Line((-24.387077, -44.583261), (-24.387077, -19.337865))
            ThreePointArc((-24.387077, -19.337865), (-26.323568, -14.837865), (-22.450585, -11.837865))
        make_face()
    extrude(amount=SALIENTE_EXTRUIR3_DEPTH + SALIENTE_EXTRUIR3_DEPTH_BACK)


with BuildPart() as body_4:
    # Croquis9 → Saliente-Extruir4 (new, two sides: drawn at the far end of the back side and taken through both)
    with BuildSketch(Plane(origin=(0, 60, 0), x_dir=(1, 0, 0), z_dir=(0, 1, 0)).offset(-SALIENTE_EXTRUIR4_DEPTH_BACK)):
        with Locations(Location((-17.693226, 17.412135, 0), (0, 0, 270))):
            Circle(CROQUIS9_R)
    extrude(amount=SALIENTE_EXTRUIR4_DEPTH + SALIENTE_EXTRUIR4_DEPTH_BACK)


with BuildPart() as body_5:
    # Croquis7 → Saliente-Extruir5 (new, two sides: drawn at the far end of the back side and taken through both)
    with BuildSketch(Plane(origin=(0, 60, 0), x_dir=(1, 0, 0), z_dir=(0, 1, 0)).offset(-SALIENTE_EXTRUIR5_DEPTH_BACK)):
        with BuildLine():
            Line((-23.681496, 1.037135), (-24.679541, 16.974635))
            ThreePointArc((-24.679541, 16.974635), (-17.693226, 24.412135), (-10.706911, 16.974635))
            Line((-10.706911, 16.974635), (-11.704956, 1.037135))
            ThreePointArc((-11.704956, 1.037135), (-17.693226, -4.587865), (-23.681496, 1.037135))
        make_face()
    extrude(amount=SALIENTE_EXTRUIR5_DEPTH + SALIENTE_EXTRUIR5_DEPTH_BACK)

    # Croquis8 → Saliente-Extruir6 (add, two sides: drawn at the far end of the back side and taken through both)
    with BuildSketch(Plane(origin=(0, 60, 0), x_dir=(1, 0, 0), z_dir=(0, 1, 0)).offset(-SALIENTE_EXTRUIR6_DEPTH_BACK)):
        with Locations(Location((-17.693226, 1.412135, 0), (0, 0, 270))):
            Circle(CROQUIS8_R)
    extrude(amount=SALIENTE_EXTRUIR6_DEPTH + SALIENTE_EXTRUIR6_DEPTH_BACK)


with BuildPart() as cortar_extruir1_tool:
    # Croquis11 → Cortar-Extruir1 (new body)
    with BuildSketch(Plane(origin=(0, 63, 0), x_dir=(1, 0, 0), z_dir=(0, 1, 0)).offset(CORTAR_EXTRUIR1_START)):
        with Locations(Location((-17.693226, 17.412135, 0), (0, 0, 270))):
            Circle(CROQUIS11_R)
    extrude(amount=CORTAR_EXTRUIR1_DEPTH)


with BuildPart() as body_4_1:
    add(body_4.part)

    # Cortar-Extruir1: cut by cortar_extruir1_tool
    add(cortar_extruir1_tool.part, mode=Mode.SUBTRACT)


with BuildPart() as body_5_1:
    add(body_5.part)

    # Cortar-Extruir1: cut by cortar_extruir1_tool
    add(cortar_extruir1_tool.part, mode=Mode.SUBTRACT)


solid = Compound([part.part, body_2.part, body_3.part, body_4_1.part, body_5_1.part])
